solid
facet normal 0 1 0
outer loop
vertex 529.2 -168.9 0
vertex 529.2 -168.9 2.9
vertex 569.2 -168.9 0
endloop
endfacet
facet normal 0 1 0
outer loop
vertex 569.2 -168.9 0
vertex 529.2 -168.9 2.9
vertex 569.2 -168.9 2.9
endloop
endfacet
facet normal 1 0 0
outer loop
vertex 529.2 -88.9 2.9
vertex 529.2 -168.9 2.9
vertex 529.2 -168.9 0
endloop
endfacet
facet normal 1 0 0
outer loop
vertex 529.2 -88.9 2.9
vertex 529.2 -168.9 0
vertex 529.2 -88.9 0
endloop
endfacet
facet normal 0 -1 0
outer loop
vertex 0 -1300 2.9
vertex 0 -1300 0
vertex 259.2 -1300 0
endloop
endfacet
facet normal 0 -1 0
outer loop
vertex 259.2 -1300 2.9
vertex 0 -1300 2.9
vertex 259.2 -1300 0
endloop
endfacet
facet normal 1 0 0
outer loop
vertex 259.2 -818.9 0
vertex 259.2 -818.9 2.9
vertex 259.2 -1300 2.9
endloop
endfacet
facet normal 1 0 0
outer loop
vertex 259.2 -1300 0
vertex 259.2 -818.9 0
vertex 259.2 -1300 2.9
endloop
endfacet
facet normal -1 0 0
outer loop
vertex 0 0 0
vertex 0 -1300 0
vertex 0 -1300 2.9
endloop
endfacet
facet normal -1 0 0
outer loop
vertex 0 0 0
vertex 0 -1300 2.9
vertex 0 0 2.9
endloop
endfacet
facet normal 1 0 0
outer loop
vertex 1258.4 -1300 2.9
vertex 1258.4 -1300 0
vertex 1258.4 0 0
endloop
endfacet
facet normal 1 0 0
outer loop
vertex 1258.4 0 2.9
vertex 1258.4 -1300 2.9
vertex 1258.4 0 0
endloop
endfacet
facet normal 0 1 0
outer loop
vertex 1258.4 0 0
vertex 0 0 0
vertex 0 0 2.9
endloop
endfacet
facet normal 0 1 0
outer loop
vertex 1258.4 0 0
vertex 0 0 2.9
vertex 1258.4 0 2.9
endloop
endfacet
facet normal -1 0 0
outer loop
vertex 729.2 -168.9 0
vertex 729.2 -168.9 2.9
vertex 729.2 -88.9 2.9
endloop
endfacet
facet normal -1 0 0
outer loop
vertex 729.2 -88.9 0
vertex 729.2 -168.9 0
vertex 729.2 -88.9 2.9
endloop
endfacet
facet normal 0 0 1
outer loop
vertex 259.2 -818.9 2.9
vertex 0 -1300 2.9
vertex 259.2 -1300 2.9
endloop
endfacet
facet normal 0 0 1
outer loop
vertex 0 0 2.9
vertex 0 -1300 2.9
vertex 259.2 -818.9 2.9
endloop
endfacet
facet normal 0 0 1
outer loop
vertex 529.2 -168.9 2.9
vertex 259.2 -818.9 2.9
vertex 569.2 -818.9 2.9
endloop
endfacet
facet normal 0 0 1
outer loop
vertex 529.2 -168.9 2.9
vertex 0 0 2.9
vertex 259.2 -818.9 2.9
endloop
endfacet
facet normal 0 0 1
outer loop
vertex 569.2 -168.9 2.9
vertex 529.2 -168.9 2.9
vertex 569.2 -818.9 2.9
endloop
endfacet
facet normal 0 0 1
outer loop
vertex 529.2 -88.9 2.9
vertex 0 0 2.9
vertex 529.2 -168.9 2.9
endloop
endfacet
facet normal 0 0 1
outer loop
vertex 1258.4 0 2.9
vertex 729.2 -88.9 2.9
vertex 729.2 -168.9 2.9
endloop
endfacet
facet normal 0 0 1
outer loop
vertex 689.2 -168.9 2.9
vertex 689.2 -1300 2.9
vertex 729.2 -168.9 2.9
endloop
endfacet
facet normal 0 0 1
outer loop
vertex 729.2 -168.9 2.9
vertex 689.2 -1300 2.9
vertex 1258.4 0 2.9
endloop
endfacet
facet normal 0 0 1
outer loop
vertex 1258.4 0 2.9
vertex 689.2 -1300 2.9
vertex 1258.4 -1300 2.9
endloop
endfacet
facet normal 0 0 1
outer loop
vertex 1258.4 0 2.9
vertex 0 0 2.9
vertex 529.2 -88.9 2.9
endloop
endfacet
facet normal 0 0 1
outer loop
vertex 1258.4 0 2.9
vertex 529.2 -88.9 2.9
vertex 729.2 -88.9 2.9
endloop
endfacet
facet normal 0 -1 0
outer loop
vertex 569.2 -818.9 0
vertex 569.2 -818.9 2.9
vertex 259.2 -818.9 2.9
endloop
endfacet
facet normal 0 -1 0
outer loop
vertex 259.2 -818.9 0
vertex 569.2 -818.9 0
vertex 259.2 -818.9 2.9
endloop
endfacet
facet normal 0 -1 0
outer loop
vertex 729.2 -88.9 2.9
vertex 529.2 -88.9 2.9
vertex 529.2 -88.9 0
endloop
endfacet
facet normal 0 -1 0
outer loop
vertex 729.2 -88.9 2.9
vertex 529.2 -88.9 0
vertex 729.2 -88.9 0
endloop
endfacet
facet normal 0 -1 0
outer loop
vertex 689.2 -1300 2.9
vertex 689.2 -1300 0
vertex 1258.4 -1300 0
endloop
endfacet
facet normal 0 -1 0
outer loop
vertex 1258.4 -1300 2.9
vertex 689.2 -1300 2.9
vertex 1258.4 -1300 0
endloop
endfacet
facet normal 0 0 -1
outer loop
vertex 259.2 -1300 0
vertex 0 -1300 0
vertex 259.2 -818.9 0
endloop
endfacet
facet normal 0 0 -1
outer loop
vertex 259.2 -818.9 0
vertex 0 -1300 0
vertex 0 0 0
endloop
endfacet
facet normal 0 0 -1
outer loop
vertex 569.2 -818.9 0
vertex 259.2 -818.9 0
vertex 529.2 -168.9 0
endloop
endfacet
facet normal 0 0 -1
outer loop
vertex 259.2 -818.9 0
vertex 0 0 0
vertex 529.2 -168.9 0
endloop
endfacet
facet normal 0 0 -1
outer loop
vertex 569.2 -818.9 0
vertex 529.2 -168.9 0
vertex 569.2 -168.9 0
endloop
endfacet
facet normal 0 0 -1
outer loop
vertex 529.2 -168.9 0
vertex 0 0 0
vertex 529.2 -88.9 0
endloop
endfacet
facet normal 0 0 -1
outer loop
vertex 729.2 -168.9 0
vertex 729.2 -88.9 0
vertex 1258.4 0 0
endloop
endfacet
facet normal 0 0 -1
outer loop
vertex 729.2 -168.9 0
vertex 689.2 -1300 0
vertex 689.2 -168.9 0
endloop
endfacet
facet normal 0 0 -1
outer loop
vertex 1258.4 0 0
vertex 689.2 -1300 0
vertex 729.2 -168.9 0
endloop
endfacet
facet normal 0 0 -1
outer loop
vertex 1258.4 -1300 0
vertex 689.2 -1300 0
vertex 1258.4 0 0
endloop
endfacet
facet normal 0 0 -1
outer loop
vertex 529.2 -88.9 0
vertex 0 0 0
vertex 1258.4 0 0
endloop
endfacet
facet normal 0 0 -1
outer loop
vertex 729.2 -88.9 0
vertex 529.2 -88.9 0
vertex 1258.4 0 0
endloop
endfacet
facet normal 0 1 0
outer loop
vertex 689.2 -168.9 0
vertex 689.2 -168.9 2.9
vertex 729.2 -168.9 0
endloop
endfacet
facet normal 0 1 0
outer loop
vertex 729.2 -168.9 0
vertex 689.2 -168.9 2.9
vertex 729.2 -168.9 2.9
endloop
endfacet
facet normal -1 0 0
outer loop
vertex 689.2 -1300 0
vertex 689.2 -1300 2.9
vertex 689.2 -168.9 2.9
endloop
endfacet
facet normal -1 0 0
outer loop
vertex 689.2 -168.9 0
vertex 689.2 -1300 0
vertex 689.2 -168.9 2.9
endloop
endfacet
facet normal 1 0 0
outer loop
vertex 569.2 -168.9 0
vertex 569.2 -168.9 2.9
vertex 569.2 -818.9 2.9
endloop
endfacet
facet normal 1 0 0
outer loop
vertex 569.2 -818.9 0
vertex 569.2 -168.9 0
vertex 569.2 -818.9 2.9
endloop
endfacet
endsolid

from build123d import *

# Parameters (mm, degrees)
CROQUIS1_W              = 1258.4
CROQUIS1_H              = 1300
SALIENTE_EXTRUIR1_DEPTH = 2.9
CROQUIS2_W              = 200
CROQUIS2_H              = 80
CORTAR_EXTRUIR1_DEPTH   = 10
CORTAR_EXTRUIR2_DEPTH   = 3


with BuildPart() as part:
    # Croquis1 → Saliente-Extruir1 (new body)
    with BuildSketch(Plane.XY):
        with Locations((629.2, -650)):
            Rectangle(CROQUIS1_W, CROQUIS1_H)
    extrude(amount=SALIENTE_EXTRUIR1_DEPTH)

    # Croquis2 → Cortar-Extruir1 (cut)
    with BuildSketch(Plane.XY.offset(2.9)):
        with Locations((629.2, -128.9)):
            Rectangle(CROQUIS2_W, CROQUIS2_H)
    extrude(amount=-CORTAR_EXTRUIR1_DEPTH, mode=Mode.SUBTRACT)

    # Croquis3 → Cortar-Extruir2 (cut)
    with BuildSketch(Plane.XY.offset(2.9)):
        Polygon((569.2, -168.9), (569.2, -818.9), (259.2, -818.9), (259.2, -1300), (689.2, -1300), (689.2, -168.9), align=None)
    extrude(amount=-CORTAR_EXTRUIR2_DEPTH, mode=Mode.SUBTRACT)


solid = part.part
